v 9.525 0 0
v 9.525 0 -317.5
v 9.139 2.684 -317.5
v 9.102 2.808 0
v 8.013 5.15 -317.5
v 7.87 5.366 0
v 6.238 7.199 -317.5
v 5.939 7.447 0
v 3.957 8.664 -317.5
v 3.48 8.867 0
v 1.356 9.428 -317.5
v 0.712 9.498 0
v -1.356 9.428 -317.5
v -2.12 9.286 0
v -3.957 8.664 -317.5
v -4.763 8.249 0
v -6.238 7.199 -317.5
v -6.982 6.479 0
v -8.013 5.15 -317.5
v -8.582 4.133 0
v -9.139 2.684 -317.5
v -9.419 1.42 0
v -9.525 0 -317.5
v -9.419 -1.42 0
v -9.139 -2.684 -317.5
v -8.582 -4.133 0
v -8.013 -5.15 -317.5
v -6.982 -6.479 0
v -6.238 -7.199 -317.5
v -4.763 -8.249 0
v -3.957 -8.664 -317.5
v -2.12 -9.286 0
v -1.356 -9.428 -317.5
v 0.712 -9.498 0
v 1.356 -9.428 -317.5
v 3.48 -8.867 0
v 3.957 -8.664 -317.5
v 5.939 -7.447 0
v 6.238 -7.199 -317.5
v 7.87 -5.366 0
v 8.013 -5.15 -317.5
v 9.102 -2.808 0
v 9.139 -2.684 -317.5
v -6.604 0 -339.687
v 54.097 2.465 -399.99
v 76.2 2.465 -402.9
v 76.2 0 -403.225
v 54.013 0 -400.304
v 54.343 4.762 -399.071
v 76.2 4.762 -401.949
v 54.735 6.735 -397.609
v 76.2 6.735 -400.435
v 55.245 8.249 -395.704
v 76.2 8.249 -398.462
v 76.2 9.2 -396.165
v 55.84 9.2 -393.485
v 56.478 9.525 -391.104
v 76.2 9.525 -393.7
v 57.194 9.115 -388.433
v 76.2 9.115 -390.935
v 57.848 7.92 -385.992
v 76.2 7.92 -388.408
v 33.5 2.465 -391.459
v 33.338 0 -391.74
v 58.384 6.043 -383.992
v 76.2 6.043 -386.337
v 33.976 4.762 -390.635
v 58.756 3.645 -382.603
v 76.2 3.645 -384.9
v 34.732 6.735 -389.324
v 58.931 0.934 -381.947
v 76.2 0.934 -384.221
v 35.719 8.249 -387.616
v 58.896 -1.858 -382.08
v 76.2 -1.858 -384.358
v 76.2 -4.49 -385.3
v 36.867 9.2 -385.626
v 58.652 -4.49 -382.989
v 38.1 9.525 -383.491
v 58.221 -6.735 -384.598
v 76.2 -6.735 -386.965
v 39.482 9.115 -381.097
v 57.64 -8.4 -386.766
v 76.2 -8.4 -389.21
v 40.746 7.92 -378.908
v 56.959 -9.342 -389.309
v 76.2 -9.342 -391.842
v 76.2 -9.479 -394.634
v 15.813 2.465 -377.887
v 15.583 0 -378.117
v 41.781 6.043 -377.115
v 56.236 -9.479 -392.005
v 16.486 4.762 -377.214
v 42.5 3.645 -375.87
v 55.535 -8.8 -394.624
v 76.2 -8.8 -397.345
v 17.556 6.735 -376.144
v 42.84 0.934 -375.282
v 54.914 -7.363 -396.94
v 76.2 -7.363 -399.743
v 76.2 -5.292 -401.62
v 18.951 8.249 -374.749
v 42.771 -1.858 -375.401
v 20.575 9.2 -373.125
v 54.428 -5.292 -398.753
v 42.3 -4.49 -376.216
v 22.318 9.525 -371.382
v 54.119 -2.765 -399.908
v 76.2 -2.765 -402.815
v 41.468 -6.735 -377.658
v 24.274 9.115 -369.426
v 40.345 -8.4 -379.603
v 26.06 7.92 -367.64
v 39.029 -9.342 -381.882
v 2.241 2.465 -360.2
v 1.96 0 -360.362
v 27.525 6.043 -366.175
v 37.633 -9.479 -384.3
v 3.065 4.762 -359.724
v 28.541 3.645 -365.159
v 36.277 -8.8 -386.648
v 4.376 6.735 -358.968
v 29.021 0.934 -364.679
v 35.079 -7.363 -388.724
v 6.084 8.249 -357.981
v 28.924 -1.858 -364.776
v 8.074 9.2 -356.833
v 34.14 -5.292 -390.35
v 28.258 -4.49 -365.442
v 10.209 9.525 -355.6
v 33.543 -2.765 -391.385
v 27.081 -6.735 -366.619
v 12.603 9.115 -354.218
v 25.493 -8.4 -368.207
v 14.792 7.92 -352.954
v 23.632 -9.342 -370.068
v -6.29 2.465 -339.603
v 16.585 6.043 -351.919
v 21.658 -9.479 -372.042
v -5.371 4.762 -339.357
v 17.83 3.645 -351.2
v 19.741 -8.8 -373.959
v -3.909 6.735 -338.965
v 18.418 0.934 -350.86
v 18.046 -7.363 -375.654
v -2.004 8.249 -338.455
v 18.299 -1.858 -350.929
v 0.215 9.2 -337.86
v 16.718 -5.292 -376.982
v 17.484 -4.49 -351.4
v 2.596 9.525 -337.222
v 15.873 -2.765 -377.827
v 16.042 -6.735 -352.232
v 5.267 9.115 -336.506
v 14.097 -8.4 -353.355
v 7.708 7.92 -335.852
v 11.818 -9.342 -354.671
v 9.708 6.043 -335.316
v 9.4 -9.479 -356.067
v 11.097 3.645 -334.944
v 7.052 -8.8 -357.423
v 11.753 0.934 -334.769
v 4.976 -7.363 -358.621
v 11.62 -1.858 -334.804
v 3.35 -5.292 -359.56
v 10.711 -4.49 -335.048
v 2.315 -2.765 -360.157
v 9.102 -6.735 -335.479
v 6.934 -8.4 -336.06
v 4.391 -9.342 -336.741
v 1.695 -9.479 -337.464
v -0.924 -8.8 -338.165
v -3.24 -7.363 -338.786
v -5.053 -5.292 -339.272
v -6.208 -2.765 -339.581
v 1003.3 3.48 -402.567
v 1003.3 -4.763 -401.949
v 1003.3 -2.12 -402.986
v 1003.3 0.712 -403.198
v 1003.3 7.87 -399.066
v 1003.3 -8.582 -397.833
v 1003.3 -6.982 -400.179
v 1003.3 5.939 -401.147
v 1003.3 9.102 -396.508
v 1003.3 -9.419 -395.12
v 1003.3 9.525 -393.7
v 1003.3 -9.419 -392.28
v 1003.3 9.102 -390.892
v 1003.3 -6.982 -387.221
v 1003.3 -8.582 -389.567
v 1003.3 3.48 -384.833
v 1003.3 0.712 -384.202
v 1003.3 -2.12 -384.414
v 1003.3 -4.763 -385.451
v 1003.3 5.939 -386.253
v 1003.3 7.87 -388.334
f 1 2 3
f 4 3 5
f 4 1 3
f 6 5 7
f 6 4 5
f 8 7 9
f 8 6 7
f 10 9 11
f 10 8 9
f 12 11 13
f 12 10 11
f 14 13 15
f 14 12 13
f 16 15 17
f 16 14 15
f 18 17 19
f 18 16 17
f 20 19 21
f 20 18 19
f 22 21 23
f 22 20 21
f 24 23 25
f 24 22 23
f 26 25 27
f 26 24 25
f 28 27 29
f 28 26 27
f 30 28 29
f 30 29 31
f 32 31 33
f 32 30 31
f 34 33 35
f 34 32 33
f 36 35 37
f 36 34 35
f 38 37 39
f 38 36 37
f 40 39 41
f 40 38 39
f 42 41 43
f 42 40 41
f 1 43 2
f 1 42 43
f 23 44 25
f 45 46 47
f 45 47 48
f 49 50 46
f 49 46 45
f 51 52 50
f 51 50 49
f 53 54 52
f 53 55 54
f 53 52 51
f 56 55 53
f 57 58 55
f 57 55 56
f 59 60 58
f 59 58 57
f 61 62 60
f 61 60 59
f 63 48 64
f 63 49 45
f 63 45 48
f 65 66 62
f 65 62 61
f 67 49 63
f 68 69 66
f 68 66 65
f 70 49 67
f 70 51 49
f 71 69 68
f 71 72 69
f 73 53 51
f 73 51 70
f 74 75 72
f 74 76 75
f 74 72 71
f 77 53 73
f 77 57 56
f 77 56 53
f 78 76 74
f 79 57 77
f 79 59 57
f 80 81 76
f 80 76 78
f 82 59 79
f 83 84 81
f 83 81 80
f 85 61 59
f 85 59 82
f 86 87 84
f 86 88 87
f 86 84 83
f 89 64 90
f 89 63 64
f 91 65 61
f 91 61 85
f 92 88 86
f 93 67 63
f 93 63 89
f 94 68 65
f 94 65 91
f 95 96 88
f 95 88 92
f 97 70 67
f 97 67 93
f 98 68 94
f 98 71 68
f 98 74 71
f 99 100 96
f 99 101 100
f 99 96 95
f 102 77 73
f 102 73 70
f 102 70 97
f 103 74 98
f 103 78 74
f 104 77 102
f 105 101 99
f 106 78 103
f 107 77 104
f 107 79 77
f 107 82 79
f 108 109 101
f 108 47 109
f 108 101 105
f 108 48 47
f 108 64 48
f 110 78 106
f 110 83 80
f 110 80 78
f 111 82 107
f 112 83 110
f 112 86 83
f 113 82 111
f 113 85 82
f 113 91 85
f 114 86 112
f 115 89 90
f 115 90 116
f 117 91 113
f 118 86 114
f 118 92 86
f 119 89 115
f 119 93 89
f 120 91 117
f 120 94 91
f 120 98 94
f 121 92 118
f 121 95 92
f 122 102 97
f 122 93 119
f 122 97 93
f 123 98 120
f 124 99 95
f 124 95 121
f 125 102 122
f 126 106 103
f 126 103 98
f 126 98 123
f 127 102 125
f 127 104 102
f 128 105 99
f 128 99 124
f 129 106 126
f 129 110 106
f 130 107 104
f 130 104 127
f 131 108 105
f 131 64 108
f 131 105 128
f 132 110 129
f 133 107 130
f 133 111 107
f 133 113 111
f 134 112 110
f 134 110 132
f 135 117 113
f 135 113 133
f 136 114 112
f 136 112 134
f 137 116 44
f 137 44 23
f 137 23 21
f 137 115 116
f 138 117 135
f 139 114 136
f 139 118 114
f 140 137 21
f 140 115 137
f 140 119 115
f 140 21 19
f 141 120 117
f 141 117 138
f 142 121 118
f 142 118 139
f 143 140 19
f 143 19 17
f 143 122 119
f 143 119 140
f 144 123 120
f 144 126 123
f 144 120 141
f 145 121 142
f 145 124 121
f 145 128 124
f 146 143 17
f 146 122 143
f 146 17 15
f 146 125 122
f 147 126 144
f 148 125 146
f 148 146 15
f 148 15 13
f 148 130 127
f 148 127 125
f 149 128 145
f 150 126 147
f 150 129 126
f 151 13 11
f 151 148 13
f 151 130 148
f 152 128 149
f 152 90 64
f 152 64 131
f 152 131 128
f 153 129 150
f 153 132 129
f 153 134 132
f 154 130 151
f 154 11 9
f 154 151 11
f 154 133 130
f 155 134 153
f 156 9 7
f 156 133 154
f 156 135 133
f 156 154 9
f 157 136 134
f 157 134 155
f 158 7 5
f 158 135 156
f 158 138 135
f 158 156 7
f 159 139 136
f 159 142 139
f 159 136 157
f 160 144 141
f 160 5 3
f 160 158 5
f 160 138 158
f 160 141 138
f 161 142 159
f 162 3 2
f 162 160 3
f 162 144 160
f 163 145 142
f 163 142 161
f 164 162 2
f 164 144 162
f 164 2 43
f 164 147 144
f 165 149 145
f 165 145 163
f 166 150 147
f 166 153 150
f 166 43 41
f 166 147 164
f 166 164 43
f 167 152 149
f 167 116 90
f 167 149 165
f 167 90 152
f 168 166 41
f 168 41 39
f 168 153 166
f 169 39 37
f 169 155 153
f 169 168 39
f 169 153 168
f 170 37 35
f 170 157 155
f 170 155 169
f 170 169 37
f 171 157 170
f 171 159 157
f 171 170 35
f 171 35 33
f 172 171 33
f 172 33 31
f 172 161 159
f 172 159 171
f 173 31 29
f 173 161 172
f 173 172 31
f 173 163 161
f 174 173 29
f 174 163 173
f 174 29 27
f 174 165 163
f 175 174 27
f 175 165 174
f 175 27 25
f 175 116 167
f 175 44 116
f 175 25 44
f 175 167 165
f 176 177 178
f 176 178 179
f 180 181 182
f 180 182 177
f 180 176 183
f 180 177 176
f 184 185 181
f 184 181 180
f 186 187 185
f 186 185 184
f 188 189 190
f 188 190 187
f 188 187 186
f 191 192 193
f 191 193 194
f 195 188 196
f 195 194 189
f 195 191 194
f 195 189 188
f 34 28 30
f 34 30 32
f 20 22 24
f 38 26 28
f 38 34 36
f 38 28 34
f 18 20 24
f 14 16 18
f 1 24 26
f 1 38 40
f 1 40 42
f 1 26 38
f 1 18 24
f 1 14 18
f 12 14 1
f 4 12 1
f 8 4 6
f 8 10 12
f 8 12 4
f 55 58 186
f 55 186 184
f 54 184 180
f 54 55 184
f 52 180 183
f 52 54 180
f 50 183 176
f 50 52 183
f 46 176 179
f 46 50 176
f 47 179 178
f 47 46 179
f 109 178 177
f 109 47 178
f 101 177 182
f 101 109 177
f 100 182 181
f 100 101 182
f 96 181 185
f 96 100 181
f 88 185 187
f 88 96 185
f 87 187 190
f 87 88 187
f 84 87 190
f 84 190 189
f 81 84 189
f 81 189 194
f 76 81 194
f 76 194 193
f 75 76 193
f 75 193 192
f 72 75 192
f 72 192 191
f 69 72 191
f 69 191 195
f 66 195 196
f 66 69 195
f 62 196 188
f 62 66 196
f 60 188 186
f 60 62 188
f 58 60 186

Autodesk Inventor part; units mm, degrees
ref_plane "XZ Plane" through (0, 0, 0) normal (0, 1, 0) x (-1, 0, 0)
ref_plane "XY Plane" through (0, 0, 0) normal (0, 0, 1) x (1, 0, 0)
sketch "Sketch2" plane through (0, 0, 0) normal (0, 0, 1) x (1, 0, 0)
  circle A0 centre (0, 0) radius 9.525
  dimension "d3" = 19.05
extrude "Extrusion2" add sketch "Sketch2" against normal blind 317.5
ref_plane "Work Plane1" through (76.2, 0, 0) normal (1, 0, 0) x (0, 1, 0)
sketch "Sketch9" plane through (76.2, 0, 0) normal (1, 0, 0) x (0, 1, 0)
  line L0 (-9.525, -317.5) -> (9.525, -317.5) projected
  circle A0 centre (0, -393.7) radius 9.525
  line L1 (0, -317.5) -> (0, -393.7) construction
  point P0 (0, 0)
  dimension "d17" = 19.05
  dimension "d18" = 76.2
extrude "Extrusion4" add sketch "Sketch9" along normal blind 927.1
sketch "Sketch11" plane through (0, 0, -317.5) normal (0, 0, -1) x (-1, 0, 0)
  circle A0 centre (0, 0) radius 9.525 projected
sketch "Sketch12" plane through (0, 0, 0) normal (0, 1, 0) x (-1, 0, 0)
  line L0 (-76.2, -403.225) -> (-76.2, -384.175) projected
  line L1 (-9.525, -317.5) -> (9.525, -317.5) projected
  arc A0 (-76.2, -393.7) -> (0, -317.5) centre (-76.2, -317.5) ccw
  point P0 (0, 0)
  dimension "d21" = 76.2
sweep "Sweep2" add profiles "Sketch11" path "Sketch12" path curves A0
equation "\"d3\" = tubeD"
equation "\"d17\" = tubeD"
equation "\"d18\" = tubeTurnR"
equation "\"d21\" = tubeTurnR"
equation "\"d4\" = tubeTurnR"
equation "\"wallThick\" = 44.45"
equation "\"roomWidth\" = 3048"
equation "\"roomDepth\" = 3657.6"
equation "\"roomHeight\" = 2438.4"
equation "\"doorWidth\" = 895.35"
equation "\"doorHeight\" = 2108.2"
equation "\"doorX\" = 774.7"
equation "\"doorY\" = 88.9"
equation "\"doorLip\" = 76.2"
equation "\"doorThick\" = 57.15"
equation "\"tubeTurnR\" = 76.2"
equation "\"tubeD\" = 19.05"
properties part number "left_tube_0"
